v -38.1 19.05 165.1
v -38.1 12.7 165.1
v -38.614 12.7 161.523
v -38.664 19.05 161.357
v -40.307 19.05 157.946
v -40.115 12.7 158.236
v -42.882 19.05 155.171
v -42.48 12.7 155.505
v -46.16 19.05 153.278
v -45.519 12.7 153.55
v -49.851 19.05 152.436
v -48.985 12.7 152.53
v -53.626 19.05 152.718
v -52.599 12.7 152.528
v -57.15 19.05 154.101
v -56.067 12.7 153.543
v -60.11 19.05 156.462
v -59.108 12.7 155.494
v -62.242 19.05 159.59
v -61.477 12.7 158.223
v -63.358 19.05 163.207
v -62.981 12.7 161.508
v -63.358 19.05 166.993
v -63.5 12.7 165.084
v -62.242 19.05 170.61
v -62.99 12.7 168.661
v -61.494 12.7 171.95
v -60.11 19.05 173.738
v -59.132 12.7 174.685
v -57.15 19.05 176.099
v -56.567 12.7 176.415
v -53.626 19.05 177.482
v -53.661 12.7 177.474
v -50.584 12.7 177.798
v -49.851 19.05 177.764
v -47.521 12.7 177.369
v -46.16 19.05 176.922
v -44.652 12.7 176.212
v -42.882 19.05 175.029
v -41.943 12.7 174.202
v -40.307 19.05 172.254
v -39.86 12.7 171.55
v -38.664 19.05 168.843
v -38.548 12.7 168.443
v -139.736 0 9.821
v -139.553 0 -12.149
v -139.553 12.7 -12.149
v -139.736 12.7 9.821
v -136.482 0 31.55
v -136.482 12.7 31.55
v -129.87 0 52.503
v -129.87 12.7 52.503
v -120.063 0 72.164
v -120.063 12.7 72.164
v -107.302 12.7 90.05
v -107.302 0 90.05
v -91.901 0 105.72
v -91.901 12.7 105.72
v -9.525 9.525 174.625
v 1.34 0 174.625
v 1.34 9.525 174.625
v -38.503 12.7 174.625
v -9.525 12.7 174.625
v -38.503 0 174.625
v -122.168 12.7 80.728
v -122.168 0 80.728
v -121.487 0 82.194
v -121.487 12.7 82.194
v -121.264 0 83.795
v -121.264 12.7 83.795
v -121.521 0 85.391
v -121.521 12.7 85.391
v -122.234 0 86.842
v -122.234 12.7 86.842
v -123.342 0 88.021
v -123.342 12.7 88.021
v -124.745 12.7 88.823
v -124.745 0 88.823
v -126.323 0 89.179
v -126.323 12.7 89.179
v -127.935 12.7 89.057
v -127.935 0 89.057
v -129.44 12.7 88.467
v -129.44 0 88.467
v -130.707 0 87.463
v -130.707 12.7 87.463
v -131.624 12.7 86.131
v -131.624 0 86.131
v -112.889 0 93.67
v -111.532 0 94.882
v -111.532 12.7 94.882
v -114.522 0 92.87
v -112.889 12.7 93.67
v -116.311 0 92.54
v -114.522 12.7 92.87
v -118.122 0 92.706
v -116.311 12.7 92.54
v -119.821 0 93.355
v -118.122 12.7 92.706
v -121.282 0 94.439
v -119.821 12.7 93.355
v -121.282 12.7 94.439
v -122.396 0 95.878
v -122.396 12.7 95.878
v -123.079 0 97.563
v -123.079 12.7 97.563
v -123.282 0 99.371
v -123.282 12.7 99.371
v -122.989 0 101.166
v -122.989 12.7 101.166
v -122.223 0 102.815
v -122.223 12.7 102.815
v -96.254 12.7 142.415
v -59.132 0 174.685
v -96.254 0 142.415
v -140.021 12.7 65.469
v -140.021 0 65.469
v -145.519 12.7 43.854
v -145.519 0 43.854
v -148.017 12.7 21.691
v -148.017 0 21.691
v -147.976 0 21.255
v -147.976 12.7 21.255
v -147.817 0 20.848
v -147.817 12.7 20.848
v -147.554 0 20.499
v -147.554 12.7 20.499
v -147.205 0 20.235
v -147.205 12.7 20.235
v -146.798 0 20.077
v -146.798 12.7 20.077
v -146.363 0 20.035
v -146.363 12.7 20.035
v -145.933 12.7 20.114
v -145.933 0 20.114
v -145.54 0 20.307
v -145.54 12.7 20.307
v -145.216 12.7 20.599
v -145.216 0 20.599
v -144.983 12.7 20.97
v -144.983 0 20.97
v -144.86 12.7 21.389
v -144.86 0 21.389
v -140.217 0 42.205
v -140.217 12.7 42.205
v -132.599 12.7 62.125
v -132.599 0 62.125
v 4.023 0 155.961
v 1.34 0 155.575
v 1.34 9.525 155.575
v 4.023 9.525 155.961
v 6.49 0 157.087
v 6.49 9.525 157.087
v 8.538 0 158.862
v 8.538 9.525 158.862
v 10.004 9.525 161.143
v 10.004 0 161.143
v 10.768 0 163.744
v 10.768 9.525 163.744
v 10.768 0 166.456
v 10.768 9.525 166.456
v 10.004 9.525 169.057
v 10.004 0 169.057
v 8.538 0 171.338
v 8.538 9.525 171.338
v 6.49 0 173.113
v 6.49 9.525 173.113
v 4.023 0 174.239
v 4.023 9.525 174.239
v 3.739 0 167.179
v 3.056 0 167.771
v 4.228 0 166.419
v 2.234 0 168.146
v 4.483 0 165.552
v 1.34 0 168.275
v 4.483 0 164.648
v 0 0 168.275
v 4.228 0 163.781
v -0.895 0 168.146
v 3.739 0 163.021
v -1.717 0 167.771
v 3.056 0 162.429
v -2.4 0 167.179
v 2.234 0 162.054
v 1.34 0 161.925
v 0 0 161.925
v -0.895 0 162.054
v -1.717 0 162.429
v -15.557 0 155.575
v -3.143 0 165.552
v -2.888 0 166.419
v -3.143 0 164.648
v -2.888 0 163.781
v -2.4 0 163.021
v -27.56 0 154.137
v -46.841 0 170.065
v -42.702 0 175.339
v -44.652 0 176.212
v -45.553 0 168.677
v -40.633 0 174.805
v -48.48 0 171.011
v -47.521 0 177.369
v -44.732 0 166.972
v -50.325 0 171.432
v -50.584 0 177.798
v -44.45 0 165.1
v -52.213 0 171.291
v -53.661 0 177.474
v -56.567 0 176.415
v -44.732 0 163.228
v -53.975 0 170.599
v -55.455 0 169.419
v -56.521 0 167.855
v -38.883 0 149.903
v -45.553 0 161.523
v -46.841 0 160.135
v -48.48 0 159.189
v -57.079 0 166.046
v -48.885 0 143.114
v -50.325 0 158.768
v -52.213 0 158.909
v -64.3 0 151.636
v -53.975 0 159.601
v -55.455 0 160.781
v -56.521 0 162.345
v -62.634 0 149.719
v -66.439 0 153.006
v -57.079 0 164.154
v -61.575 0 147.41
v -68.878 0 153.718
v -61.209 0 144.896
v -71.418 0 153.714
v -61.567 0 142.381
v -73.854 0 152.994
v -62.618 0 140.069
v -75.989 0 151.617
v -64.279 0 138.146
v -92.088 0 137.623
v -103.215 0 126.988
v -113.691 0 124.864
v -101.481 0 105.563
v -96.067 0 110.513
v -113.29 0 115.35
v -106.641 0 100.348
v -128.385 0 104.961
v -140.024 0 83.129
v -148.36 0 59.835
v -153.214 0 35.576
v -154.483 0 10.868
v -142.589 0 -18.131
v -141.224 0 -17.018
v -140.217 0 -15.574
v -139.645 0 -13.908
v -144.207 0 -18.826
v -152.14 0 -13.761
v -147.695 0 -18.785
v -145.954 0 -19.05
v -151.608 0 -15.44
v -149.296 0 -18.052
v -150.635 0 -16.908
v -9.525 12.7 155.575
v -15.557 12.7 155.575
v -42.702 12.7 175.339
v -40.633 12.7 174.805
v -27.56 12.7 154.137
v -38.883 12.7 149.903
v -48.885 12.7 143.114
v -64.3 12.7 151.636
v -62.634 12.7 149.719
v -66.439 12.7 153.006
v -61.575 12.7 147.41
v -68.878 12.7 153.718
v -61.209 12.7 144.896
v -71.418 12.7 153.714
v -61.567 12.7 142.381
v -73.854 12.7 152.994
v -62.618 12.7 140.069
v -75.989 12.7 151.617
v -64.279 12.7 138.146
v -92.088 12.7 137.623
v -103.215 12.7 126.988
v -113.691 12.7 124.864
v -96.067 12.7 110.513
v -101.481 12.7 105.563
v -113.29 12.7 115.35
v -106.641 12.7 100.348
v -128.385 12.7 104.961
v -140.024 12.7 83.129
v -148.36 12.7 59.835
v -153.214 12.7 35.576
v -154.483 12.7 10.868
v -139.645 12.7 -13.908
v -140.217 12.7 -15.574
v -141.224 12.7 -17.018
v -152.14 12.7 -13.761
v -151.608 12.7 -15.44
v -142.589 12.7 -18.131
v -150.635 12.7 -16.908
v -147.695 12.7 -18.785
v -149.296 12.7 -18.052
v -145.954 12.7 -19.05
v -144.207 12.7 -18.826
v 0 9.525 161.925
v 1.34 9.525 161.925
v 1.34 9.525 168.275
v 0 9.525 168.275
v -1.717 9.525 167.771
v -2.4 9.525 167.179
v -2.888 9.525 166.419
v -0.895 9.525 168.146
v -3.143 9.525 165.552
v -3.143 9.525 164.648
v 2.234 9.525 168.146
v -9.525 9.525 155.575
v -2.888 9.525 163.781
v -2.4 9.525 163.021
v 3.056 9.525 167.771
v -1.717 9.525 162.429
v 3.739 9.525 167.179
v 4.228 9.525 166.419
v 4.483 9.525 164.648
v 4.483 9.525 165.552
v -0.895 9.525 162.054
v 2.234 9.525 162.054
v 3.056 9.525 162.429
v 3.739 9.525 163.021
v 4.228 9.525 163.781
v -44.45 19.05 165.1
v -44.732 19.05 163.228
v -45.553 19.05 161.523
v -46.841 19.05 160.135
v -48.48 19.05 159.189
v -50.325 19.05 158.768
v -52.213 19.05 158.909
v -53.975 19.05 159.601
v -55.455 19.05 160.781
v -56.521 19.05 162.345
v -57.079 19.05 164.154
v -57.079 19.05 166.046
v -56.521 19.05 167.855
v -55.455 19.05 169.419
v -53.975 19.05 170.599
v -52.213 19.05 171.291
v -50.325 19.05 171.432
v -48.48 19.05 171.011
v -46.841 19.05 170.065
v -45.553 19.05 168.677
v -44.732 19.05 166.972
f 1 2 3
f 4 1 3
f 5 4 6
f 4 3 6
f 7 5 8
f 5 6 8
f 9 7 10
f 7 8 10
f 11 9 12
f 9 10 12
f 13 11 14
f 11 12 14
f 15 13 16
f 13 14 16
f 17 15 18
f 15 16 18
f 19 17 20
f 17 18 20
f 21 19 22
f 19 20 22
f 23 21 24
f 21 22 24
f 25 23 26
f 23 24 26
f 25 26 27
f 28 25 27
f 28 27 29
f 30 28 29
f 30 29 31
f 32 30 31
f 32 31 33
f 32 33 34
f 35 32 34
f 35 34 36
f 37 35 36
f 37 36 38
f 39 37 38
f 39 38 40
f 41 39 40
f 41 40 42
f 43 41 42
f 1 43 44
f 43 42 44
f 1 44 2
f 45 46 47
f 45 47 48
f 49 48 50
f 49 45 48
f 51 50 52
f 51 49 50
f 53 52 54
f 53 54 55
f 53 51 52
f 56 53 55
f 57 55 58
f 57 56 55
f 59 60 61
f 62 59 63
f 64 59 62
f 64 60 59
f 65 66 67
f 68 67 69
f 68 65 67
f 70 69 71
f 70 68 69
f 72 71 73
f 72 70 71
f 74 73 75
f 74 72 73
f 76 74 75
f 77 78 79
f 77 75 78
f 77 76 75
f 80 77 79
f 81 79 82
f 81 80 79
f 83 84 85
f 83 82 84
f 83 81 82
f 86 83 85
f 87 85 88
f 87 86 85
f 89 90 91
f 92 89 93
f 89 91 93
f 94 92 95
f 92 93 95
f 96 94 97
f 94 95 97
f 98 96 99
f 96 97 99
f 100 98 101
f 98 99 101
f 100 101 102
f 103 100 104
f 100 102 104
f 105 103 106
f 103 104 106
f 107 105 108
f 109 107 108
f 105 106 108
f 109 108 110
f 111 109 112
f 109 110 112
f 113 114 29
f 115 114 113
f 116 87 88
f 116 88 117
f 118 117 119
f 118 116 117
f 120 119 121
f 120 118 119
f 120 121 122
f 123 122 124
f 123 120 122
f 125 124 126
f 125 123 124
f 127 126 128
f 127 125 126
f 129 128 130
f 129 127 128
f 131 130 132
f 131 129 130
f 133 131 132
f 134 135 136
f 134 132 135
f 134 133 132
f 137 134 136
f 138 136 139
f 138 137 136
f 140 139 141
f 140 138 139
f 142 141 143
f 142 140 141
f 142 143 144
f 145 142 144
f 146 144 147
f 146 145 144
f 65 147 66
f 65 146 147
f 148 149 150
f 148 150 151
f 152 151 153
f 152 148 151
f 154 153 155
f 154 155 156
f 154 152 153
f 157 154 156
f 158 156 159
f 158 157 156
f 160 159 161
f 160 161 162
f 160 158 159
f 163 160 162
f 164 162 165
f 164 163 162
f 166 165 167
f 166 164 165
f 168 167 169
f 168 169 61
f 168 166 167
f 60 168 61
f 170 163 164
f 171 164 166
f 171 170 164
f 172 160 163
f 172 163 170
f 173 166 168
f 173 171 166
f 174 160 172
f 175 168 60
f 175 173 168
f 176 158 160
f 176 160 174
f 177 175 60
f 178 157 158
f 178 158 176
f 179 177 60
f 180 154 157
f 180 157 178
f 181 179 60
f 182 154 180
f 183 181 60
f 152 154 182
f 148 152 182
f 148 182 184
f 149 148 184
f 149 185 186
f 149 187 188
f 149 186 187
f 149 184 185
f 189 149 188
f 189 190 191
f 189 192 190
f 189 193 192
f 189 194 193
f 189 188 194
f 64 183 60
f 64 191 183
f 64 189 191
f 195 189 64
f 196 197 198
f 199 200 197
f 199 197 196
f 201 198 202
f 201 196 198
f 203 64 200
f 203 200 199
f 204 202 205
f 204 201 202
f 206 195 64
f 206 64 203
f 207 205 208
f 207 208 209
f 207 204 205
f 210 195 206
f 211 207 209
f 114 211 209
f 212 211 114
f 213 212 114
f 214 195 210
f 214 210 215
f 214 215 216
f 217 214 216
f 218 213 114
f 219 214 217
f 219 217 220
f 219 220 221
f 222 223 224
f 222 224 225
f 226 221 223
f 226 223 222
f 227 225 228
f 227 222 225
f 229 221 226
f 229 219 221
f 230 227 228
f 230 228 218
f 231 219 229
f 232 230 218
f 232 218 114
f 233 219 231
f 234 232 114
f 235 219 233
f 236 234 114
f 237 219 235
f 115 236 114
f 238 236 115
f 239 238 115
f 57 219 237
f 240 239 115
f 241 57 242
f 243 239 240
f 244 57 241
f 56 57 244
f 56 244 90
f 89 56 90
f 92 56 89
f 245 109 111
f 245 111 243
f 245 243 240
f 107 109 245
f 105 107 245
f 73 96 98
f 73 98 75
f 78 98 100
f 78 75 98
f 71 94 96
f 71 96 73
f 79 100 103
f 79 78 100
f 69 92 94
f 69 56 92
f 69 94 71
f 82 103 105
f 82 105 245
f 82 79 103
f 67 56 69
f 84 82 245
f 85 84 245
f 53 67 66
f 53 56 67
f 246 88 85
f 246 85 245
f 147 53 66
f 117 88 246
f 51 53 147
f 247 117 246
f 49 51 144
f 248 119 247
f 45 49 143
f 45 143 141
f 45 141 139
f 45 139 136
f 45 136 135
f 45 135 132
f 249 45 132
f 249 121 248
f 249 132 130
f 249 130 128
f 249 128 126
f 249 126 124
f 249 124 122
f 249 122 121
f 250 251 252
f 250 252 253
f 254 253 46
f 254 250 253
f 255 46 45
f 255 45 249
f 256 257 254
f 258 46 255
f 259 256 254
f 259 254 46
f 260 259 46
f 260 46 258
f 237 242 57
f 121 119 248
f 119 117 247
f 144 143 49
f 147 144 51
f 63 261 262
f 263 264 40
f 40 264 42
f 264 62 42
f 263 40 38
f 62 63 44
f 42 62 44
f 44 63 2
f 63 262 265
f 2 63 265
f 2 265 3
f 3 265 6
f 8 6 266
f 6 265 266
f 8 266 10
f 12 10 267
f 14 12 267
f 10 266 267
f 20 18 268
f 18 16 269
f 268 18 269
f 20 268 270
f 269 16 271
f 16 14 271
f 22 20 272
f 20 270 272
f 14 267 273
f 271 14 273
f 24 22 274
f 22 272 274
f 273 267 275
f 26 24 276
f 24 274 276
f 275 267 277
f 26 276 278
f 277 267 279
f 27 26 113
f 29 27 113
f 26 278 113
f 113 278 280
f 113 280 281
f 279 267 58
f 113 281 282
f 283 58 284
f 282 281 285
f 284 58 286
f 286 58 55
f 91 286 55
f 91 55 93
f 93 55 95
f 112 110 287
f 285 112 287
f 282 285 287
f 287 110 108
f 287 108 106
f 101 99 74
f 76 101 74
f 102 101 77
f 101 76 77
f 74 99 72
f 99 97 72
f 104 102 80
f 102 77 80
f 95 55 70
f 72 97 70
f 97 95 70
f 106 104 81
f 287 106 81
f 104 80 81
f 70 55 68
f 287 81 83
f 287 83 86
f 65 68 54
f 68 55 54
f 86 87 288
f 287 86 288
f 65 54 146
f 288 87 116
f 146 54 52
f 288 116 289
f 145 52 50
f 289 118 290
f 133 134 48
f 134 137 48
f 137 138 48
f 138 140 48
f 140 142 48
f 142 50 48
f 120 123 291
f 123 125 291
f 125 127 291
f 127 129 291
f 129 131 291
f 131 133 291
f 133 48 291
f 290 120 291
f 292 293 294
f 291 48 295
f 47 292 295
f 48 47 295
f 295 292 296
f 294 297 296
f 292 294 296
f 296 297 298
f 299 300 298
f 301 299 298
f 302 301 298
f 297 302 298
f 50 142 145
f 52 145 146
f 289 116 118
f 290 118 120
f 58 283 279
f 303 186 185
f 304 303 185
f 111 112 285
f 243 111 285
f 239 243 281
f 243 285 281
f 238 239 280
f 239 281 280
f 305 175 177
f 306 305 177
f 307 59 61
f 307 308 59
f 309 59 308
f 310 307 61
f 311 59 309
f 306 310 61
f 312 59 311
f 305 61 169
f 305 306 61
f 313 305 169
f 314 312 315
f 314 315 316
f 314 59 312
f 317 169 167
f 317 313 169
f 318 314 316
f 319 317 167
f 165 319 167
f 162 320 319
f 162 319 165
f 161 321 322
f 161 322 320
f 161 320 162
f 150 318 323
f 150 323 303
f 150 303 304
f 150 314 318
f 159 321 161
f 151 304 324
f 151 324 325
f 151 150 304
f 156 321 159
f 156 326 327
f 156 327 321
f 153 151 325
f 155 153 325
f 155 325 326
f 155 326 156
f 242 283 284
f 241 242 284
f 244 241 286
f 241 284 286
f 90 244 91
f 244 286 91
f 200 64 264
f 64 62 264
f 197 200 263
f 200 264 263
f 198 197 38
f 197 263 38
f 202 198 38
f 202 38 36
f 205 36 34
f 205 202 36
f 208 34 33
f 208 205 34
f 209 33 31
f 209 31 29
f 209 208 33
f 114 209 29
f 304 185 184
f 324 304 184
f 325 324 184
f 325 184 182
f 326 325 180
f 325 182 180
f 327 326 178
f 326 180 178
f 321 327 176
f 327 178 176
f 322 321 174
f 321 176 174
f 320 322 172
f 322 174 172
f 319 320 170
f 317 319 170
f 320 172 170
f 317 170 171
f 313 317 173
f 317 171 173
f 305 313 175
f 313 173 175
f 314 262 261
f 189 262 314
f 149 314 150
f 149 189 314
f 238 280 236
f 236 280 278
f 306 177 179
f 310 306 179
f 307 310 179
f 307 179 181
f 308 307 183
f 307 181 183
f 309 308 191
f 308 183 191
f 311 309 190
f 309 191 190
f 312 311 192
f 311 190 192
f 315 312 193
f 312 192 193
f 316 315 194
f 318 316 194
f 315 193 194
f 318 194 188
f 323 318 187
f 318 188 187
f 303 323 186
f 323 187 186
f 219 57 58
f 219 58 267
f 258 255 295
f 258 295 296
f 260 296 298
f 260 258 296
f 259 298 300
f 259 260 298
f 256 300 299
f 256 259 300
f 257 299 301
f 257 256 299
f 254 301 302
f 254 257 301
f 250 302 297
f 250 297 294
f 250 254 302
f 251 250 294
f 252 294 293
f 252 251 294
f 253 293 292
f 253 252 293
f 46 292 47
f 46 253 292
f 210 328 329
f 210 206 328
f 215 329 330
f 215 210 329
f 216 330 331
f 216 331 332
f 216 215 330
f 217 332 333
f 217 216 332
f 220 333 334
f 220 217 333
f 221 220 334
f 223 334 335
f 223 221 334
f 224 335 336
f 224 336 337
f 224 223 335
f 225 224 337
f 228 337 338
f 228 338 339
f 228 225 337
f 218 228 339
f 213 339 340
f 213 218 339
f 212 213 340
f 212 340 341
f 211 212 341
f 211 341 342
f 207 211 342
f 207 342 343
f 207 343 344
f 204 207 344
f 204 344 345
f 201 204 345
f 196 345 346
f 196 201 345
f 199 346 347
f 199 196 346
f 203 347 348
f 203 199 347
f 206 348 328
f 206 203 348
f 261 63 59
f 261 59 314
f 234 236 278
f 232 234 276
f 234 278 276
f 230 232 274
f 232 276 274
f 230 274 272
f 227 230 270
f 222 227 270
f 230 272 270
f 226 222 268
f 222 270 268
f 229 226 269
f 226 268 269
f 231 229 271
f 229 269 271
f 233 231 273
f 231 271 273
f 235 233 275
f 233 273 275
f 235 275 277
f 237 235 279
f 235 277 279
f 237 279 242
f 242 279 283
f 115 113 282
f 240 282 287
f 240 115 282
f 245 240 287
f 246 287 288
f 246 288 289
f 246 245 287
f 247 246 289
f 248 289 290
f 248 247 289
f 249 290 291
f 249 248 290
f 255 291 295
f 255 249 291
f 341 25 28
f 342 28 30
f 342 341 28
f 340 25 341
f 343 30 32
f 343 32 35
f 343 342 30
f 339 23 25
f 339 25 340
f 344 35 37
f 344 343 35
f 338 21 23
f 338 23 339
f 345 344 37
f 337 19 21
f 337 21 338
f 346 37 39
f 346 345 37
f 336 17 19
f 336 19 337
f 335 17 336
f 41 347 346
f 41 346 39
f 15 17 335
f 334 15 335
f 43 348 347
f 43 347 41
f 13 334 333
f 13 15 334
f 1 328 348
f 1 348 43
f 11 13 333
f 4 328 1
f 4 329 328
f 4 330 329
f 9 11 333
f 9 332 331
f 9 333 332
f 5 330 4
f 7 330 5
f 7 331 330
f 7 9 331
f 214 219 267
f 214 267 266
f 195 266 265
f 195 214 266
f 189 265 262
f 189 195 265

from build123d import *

# Parameters (mm, degrees)
SKETCH1_R           = 6.35
BOSS_EXTRUDE1_DEPTH = 12.7
CUT_EXTRUDE2_DEPTH  = 13.7
FILLET1_R           = 12.7
SKETCH4_R           = 12.7
SKETCH4_R_2         = 6.35
BOSS_EXTRUDE2_DEPTH = 6.35
SKETCH2_W           = 27.073872012
SKETCH2_H           = 29.596885175
CUT_EXTRUDE1_DEPTH  = 3.175


with BuildPart() as part:
    # Sketch1 → Boss-Extrude1 (new body)
    with BuildSketch(Plane(origin=(0, 0, 0), x_dir=(1, 0, 0), z_dir=(0, 1, 0))):
        with BuildLine():
            Line((1.339902706, -174.625), (-42.399739587, -174.625))
            ThreePointArc((-42.399739587, -174.625), (-50.754602331, -177.79991886), (-59.131949668, -174.684811669))
            Line((-59.131949668, -174.684811669), (-96.253765638, -142.415309363))
            ThreePointArc((-96.253765638, -142.415309363), (-144.617963608, -71.634466036), (-152.13989844, 13.761341376))
            ThreePointArc((-152.13989844, 13.761341376), (-145.072520944, 18.99854995), (-139.553151074, 12.149262793))
            ThreePointArc((-139.553151074, 12.149262793), (-129.869632709, -52.503000495), (-91.90140484, -105.720472707))
            Line((-91.90140484, -105.720472707), (-48.88478864, -143.114246675))
            ThreePointArc((-48.88478864, -143.114246675), (-33.347524936, -152.357947214), (-15.556989968, -155.575))
            Line((-15.556989968, -155.575), (1.339902706, -155.575))
            ThreePointArc((1.339902706, -155.575), (10.864902706, -165.1), (1.339902706, -174.625))
        make_face()
        with Locations((-50.8, -165.1)):
            Circle(SKETCH1_R, mode=Mode.SUBTRACT)
        with BuildLine():
            Line((0, -161.925), (1.339902706, -161.925))
            ThreePointArc((1.339902706, -161.925), (4.514902706, -165.1), (1.339902706, -168.275))
            Line((1.339902706, -168.275), (0, -168.275))
            ThreePointArc((0, -168.275), (-3.175, -165.1), (0, -161.925))
        make_face(mode=Mode.SUBTRACT)
    extrude(amount=BOSS_EXTRUDE1_DEPTH)

    # Sketch3 → Cut-Extrude2 (cut, through all)
    with BuildSketch(Plane(origin=(0, 12.7, 0), x_dir=(1, 0, 0), z_dir=(0, 1, 0))):
        with BuildLine():
            Line((-64.278893585, -138.146187914), (-96.067379674, -110.512878542))
            ThreePointArc((-96.067379674, -110.512878542), (-104.093661598, -102.988093371), (-111.532318829, -94.88192461))
            ThreePointArc((-111.532318829, -94.88192461), (-120.588765116, -93.847414192), (-122.222718656, -102.815113283))
            ThreePointArc((-122.222718656, -102.815113283), (-108.389889378, -121.287896312), (-92.087790804, -137.622903528))
            Line((-92.087790804, -137.622903528), (-75.989121055, -151.617263638))
            ThreePointArc((-75.989121055, -151.617263638), (-63.398469458, -150.736839511), (-64.278893585, -138.146187914))
        make_face()
        with BuildLine():
            ThreePointArc((-122.168303836, -80.727586976), (-124.013598755, -88.474110491), (-131.62448434, -86.131428157))
            ThreePointArc((-131.62448434, -86.131428157), (-143.140144863, -54.755391727), (-148.016867664, -21.690551276))
            ThreePointArc((-148.016867664, -21.690551276), (-146.581764091, -20.040770563), (-144.860415421, -21.389198324))
            ThreePointArc((-144.860415421, -21.389198324), (-136.771142128, -52.303847297), (-122.168303836, -80.727586976))
        make_face()
    extrude(amount=-CUT_EXTRUDE2_DEPTH, mode=Mode.SUBTRACT)

    # Fillet1
    fillet1_edges = [part.edges().sort_by_distance(p)[0] for p in [
        (-42.399739587, 6.35, 174.625),
    ]]
    fillet(fillet1_edges, radius=FILLET1_R)

    # Sketch4 → Boss-Extrude2 (add)
    with BuildSketch(Plane(origin=(0, 12.7, 0), x_dir=(1, 0, 0), z_dir=(0, 1, 0))):
        with Locations((-50.8, -165.1)):
            Circle(SKETCH4_R)
        with Locations((-50.8, -165.1)):
            Circle(SKETCH4_R_2, mode=Mode.SUBTRACT)
    extrude(amount=BOSS_EXTRUDE2_DEPTH)

    # Sketch2 → Cut-Extrude1 (cut)
    with BuildSketch(Plane(origin=(0, 12.7, 0), x_dir=(1, 0, 0), z_dir=(0, 1, 0))):
        with Locations((4.011936006, -165.256904056)):
            Rectangle(SKETCH2_W, SKETCH2_H)
    extrude(amount=-CUT_EXTRUDE1_DEPTH, mode=Mode.SUBTRACT)


solid = part.part
